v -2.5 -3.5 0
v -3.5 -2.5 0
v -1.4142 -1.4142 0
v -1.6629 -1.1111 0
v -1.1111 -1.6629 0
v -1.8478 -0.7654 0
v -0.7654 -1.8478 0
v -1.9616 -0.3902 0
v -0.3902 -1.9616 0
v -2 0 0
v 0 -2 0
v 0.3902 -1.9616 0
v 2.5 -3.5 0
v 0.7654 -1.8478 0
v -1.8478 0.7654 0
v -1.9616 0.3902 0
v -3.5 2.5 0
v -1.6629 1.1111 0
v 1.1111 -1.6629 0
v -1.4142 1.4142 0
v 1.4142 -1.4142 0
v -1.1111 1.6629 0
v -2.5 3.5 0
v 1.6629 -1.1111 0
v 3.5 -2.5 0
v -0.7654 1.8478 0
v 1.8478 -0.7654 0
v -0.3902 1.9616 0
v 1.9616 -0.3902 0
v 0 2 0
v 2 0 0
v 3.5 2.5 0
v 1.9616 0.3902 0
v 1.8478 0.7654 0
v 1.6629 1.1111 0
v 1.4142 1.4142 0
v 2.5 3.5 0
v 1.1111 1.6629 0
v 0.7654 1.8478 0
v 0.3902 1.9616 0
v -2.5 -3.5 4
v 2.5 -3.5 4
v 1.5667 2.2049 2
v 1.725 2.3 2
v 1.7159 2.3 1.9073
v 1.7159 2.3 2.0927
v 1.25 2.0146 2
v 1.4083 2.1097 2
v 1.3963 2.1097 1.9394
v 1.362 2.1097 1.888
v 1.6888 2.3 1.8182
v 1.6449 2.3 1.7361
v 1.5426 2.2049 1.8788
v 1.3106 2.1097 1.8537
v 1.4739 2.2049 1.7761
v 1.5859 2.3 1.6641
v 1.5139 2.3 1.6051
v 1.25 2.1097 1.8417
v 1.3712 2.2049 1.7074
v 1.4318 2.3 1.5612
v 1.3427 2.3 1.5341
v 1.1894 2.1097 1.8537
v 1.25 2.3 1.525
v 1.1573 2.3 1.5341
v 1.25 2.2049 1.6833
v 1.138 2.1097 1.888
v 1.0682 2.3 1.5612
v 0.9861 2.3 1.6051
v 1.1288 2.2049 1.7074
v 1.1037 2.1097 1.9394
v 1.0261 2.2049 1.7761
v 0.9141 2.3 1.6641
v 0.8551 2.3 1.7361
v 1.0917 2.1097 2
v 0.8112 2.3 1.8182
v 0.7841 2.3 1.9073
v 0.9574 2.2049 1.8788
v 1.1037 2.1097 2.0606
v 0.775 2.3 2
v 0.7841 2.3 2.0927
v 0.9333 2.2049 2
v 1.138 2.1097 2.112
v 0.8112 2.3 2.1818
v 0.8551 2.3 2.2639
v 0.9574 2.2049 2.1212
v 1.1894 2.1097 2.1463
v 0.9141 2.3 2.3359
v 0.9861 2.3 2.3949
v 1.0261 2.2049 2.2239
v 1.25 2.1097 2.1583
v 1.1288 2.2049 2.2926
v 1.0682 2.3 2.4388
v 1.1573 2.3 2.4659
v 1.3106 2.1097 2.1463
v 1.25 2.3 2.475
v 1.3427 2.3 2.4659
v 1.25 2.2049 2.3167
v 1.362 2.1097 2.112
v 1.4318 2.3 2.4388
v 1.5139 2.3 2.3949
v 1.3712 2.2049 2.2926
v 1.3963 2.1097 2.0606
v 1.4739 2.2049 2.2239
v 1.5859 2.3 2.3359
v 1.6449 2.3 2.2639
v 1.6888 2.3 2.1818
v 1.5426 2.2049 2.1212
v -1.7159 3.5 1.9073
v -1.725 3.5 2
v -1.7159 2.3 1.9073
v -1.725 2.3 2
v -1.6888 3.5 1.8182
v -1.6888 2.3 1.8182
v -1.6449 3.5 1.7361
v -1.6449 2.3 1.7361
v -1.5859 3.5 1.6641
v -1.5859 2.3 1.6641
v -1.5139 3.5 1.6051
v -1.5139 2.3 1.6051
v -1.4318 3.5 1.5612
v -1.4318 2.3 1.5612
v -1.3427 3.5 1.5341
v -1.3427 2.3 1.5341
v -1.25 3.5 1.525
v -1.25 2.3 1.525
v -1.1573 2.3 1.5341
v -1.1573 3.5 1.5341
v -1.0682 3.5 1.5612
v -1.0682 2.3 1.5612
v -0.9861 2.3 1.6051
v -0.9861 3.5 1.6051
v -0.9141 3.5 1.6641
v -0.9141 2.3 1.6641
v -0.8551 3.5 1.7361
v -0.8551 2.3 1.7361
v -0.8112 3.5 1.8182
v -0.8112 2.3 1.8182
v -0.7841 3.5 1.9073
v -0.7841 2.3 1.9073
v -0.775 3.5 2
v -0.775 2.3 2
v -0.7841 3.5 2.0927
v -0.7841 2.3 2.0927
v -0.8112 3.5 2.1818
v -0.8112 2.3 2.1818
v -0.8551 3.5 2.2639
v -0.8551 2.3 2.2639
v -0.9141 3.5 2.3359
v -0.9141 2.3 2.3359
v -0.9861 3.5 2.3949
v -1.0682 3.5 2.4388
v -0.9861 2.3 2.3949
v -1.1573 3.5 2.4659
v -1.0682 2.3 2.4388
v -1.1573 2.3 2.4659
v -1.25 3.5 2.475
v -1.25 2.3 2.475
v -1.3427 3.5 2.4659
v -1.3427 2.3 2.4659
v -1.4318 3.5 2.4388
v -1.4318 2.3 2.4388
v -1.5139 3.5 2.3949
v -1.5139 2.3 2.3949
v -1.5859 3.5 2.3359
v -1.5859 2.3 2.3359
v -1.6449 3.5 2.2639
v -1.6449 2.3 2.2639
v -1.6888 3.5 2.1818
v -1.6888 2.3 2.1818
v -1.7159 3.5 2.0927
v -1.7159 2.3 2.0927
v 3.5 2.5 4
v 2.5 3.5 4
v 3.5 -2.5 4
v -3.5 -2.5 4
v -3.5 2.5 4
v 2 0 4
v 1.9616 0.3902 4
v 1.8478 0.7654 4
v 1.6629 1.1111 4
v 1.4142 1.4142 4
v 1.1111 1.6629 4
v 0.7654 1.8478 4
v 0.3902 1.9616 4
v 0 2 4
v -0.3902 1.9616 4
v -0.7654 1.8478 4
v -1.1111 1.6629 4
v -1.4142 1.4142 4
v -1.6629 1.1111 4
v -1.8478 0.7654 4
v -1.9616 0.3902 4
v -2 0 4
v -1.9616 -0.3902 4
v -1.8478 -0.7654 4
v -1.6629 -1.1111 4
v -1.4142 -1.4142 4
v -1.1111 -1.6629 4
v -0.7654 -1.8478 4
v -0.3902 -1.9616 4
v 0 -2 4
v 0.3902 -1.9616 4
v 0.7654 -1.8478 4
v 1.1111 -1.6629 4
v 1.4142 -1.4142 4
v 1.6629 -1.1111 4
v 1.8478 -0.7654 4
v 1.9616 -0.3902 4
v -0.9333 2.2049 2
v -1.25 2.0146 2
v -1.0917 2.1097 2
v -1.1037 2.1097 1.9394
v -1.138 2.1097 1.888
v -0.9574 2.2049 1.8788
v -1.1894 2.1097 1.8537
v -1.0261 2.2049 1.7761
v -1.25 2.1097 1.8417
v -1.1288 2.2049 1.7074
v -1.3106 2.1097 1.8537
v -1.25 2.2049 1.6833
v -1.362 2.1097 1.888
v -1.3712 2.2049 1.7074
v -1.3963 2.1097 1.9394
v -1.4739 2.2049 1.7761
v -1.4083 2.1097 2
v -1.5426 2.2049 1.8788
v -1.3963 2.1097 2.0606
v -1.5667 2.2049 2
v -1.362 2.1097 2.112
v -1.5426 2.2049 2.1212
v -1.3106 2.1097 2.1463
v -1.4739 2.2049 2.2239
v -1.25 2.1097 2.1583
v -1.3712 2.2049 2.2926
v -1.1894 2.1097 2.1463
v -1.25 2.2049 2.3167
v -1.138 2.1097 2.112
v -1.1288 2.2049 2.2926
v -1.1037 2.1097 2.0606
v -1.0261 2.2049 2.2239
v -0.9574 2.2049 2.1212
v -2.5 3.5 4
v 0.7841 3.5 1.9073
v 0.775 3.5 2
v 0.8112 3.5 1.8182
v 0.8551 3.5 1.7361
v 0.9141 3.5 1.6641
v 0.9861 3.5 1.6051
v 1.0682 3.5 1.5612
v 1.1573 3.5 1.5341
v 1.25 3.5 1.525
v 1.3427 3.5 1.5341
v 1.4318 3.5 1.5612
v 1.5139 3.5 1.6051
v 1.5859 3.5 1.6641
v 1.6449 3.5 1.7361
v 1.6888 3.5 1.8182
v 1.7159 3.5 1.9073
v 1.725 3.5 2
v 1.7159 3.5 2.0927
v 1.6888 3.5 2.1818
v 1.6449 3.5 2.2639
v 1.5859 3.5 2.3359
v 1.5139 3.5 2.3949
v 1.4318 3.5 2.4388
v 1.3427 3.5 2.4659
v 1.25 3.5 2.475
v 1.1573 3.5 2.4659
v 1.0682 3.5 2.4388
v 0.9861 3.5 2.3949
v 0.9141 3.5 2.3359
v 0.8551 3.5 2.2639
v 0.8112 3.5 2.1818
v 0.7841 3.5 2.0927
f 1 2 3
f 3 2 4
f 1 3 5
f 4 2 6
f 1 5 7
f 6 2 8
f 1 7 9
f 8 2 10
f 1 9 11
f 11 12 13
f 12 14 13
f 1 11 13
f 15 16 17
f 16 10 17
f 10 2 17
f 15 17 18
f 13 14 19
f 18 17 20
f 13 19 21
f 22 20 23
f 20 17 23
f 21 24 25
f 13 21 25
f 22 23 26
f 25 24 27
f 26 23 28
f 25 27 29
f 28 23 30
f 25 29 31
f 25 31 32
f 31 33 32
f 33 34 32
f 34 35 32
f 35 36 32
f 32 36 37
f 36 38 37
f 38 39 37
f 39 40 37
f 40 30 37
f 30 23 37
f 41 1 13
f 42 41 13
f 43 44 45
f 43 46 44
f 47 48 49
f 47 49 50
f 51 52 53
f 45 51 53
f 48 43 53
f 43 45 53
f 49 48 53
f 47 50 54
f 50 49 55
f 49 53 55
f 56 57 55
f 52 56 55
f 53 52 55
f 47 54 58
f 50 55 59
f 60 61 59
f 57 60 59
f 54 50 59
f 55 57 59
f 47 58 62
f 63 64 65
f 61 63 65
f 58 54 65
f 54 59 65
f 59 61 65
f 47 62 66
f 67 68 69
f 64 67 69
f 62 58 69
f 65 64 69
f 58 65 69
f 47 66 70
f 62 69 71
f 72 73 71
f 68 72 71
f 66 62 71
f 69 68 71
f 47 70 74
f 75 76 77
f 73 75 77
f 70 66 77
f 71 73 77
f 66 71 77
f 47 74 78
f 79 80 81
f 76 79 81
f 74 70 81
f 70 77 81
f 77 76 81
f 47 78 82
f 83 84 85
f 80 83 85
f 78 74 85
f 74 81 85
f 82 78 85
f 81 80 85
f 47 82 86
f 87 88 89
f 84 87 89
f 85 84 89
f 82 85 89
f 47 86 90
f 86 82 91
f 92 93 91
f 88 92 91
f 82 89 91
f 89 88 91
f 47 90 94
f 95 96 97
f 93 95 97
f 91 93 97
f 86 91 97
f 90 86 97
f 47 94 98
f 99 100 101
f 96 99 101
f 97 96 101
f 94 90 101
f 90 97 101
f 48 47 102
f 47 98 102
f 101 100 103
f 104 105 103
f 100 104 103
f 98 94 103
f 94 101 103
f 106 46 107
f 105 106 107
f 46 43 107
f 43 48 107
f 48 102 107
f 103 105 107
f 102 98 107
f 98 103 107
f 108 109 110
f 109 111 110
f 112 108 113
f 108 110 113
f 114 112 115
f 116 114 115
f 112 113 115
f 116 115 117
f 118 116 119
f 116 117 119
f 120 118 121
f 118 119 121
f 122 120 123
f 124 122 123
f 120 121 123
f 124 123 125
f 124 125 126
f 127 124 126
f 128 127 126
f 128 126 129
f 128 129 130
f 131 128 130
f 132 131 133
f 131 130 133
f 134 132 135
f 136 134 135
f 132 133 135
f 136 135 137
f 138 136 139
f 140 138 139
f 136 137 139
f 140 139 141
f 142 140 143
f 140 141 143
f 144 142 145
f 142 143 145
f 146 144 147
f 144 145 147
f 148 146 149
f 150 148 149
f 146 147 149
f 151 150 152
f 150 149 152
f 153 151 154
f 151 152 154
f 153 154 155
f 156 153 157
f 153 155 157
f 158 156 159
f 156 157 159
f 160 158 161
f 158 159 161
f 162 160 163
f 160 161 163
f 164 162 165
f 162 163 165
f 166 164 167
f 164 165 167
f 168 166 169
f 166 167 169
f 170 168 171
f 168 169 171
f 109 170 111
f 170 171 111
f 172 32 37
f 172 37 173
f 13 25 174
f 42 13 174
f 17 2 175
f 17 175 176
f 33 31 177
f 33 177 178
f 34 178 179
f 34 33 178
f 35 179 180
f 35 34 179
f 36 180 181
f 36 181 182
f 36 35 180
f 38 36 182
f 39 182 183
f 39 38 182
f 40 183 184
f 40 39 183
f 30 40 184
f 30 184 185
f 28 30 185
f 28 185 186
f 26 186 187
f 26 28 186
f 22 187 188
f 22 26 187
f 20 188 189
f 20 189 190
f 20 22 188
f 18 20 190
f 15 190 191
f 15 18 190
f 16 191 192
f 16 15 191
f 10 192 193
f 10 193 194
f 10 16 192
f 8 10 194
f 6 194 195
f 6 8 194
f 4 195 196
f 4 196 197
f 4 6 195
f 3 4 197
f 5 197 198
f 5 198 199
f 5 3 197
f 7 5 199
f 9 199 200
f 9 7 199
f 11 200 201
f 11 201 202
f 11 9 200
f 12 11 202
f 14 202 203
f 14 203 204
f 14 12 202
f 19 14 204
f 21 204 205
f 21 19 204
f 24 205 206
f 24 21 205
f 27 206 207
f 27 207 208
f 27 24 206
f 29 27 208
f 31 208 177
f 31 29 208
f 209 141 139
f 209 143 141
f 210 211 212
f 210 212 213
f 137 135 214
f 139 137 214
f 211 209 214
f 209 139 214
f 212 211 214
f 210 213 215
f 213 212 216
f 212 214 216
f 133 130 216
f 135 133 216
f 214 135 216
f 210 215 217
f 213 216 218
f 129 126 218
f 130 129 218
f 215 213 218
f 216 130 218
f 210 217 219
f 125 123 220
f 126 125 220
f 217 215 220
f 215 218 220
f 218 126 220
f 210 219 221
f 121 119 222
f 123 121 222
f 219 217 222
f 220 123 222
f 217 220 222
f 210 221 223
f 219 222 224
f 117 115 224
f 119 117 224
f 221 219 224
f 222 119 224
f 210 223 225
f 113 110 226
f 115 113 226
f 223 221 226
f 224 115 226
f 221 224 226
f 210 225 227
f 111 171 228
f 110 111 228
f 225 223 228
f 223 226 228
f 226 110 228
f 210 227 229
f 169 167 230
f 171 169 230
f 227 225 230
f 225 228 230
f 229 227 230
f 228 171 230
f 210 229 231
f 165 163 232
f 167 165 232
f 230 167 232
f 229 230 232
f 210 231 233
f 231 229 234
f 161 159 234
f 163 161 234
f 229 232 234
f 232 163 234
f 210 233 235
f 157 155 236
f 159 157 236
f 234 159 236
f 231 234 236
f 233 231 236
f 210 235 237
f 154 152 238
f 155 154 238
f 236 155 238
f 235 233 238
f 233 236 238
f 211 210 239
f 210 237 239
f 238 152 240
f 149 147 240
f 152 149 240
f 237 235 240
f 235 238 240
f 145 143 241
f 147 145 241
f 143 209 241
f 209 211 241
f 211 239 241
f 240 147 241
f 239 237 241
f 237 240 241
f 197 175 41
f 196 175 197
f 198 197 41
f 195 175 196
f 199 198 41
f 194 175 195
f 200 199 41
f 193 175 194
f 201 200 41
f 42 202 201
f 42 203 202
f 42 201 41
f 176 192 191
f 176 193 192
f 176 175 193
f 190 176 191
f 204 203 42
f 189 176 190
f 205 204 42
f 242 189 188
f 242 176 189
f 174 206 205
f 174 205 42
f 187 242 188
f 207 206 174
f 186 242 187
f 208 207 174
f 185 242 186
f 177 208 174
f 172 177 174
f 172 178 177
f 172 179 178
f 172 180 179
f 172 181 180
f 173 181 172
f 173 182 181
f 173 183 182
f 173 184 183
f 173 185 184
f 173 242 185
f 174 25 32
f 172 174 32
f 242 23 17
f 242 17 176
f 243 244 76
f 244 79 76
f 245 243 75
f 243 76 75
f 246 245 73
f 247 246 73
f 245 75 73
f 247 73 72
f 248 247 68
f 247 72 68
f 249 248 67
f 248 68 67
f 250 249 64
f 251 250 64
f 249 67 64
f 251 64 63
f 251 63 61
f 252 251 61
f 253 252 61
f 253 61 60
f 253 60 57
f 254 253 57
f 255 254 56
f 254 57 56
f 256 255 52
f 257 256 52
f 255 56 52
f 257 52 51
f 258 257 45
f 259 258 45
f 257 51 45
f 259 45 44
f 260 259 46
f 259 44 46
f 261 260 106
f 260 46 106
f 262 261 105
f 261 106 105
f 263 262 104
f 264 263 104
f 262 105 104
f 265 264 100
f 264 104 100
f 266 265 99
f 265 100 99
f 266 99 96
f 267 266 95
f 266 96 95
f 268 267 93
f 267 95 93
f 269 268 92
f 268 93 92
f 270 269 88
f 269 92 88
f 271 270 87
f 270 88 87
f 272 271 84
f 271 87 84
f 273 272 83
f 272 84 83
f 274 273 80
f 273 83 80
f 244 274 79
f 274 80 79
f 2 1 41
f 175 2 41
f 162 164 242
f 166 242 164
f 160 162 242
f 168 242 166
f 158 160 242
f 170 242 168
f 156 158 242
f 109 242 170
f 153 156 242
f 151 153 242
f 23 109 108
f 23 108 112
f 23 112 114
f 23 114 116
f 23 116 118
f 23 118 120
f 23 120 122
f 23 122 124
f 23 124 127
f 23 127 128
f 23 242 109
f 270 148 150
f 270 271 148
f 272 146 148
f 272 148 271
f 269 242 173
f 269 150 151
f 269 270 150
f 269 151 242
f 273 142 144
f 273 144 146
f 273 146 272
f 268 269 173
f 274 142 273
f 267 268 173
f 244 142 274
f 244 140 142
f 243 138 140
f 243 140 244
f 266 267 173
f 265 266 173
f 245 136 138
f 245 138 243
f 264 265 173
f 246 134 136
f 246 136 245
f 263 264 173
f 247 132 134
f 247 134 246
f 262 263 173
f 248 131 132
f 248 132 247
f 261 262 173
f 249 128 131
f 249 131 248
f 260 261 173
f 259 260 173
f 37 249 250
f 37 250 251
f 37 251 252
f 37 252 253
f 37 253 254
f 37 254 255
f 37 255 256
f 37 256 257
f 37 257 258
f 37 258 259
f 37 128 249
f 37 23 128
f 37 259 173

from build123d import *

# Parameters (mm, degrees)
SCHIZZO1_W                       = 7
SCHIZZO1_H                       = 7
SCHIZZO1_R                       = 2
ESTRUSIONE_ESTRUSIONE1_DEPTH     = 4
SMUSSO1_SIZE                     = 1
FORO_FILETTATO_M1_2X0_25_1_D     = 0.95
FORO_FILETTATO_M1_2X0_25_1_DEPTH = 1.2
FORO_FILETTATO_M1_2X0_25_1_TIP   = 0.285408794


with BuildPart() as part:
    # Schizzo1 → Estrusione-Estrusione1 (new body)
    with BuildSketch(Plane.XY):
        Rectangle(SCHIZZO1_W, SCHIZZO1_H)
        Circle(SCHIZZO1_R, mode=Mode.SUBTRACT)
    extrude(amount=ESTRUSIONE_ESTRUSIONE1_DEPTH)

    # Smusso1
    smusso1_edges = [part.edges().sort_by_distance(p)[0] for p in [
        (-3.5, 3.5, 2),
        (3.5, 3.5, 2),
        (3.5, -3.5, 2),
        (-3.5, -3.5, 2),
    ]]
    chamfer(smusso1_edges, length=SMUSSO1_SIZE)

    # Foro filettato M1.2x0.25-1
    with Locations(Plane(origin=(-1.25, 3.5, 2), x_dir=(1, 0, 0), z_dir=(0, 1, 0))):
        with Locations((0, 0), (2.5, 0)):
            Hole(FORO_FILETTATO_M1_2X0_25_1_D / 2, depth=FORO_FILETTATO_M1_2X0_25_1_DEPTH)
            with Locations((0, 0, -(FORO_FILETTATO_M1_2X0_25_1_DEPTH + FORO_FILETTATO_M1_2X0_25_1_TIP / 2))):  # 118° drill point
                Cone(0, FORO_FILETTATO_M1_2X0_25_1_D / 2, FORO_FILETTATO_M1_2X0_25_1_TIP, mode=Mode.SUBTRACT)


solid = part.part
